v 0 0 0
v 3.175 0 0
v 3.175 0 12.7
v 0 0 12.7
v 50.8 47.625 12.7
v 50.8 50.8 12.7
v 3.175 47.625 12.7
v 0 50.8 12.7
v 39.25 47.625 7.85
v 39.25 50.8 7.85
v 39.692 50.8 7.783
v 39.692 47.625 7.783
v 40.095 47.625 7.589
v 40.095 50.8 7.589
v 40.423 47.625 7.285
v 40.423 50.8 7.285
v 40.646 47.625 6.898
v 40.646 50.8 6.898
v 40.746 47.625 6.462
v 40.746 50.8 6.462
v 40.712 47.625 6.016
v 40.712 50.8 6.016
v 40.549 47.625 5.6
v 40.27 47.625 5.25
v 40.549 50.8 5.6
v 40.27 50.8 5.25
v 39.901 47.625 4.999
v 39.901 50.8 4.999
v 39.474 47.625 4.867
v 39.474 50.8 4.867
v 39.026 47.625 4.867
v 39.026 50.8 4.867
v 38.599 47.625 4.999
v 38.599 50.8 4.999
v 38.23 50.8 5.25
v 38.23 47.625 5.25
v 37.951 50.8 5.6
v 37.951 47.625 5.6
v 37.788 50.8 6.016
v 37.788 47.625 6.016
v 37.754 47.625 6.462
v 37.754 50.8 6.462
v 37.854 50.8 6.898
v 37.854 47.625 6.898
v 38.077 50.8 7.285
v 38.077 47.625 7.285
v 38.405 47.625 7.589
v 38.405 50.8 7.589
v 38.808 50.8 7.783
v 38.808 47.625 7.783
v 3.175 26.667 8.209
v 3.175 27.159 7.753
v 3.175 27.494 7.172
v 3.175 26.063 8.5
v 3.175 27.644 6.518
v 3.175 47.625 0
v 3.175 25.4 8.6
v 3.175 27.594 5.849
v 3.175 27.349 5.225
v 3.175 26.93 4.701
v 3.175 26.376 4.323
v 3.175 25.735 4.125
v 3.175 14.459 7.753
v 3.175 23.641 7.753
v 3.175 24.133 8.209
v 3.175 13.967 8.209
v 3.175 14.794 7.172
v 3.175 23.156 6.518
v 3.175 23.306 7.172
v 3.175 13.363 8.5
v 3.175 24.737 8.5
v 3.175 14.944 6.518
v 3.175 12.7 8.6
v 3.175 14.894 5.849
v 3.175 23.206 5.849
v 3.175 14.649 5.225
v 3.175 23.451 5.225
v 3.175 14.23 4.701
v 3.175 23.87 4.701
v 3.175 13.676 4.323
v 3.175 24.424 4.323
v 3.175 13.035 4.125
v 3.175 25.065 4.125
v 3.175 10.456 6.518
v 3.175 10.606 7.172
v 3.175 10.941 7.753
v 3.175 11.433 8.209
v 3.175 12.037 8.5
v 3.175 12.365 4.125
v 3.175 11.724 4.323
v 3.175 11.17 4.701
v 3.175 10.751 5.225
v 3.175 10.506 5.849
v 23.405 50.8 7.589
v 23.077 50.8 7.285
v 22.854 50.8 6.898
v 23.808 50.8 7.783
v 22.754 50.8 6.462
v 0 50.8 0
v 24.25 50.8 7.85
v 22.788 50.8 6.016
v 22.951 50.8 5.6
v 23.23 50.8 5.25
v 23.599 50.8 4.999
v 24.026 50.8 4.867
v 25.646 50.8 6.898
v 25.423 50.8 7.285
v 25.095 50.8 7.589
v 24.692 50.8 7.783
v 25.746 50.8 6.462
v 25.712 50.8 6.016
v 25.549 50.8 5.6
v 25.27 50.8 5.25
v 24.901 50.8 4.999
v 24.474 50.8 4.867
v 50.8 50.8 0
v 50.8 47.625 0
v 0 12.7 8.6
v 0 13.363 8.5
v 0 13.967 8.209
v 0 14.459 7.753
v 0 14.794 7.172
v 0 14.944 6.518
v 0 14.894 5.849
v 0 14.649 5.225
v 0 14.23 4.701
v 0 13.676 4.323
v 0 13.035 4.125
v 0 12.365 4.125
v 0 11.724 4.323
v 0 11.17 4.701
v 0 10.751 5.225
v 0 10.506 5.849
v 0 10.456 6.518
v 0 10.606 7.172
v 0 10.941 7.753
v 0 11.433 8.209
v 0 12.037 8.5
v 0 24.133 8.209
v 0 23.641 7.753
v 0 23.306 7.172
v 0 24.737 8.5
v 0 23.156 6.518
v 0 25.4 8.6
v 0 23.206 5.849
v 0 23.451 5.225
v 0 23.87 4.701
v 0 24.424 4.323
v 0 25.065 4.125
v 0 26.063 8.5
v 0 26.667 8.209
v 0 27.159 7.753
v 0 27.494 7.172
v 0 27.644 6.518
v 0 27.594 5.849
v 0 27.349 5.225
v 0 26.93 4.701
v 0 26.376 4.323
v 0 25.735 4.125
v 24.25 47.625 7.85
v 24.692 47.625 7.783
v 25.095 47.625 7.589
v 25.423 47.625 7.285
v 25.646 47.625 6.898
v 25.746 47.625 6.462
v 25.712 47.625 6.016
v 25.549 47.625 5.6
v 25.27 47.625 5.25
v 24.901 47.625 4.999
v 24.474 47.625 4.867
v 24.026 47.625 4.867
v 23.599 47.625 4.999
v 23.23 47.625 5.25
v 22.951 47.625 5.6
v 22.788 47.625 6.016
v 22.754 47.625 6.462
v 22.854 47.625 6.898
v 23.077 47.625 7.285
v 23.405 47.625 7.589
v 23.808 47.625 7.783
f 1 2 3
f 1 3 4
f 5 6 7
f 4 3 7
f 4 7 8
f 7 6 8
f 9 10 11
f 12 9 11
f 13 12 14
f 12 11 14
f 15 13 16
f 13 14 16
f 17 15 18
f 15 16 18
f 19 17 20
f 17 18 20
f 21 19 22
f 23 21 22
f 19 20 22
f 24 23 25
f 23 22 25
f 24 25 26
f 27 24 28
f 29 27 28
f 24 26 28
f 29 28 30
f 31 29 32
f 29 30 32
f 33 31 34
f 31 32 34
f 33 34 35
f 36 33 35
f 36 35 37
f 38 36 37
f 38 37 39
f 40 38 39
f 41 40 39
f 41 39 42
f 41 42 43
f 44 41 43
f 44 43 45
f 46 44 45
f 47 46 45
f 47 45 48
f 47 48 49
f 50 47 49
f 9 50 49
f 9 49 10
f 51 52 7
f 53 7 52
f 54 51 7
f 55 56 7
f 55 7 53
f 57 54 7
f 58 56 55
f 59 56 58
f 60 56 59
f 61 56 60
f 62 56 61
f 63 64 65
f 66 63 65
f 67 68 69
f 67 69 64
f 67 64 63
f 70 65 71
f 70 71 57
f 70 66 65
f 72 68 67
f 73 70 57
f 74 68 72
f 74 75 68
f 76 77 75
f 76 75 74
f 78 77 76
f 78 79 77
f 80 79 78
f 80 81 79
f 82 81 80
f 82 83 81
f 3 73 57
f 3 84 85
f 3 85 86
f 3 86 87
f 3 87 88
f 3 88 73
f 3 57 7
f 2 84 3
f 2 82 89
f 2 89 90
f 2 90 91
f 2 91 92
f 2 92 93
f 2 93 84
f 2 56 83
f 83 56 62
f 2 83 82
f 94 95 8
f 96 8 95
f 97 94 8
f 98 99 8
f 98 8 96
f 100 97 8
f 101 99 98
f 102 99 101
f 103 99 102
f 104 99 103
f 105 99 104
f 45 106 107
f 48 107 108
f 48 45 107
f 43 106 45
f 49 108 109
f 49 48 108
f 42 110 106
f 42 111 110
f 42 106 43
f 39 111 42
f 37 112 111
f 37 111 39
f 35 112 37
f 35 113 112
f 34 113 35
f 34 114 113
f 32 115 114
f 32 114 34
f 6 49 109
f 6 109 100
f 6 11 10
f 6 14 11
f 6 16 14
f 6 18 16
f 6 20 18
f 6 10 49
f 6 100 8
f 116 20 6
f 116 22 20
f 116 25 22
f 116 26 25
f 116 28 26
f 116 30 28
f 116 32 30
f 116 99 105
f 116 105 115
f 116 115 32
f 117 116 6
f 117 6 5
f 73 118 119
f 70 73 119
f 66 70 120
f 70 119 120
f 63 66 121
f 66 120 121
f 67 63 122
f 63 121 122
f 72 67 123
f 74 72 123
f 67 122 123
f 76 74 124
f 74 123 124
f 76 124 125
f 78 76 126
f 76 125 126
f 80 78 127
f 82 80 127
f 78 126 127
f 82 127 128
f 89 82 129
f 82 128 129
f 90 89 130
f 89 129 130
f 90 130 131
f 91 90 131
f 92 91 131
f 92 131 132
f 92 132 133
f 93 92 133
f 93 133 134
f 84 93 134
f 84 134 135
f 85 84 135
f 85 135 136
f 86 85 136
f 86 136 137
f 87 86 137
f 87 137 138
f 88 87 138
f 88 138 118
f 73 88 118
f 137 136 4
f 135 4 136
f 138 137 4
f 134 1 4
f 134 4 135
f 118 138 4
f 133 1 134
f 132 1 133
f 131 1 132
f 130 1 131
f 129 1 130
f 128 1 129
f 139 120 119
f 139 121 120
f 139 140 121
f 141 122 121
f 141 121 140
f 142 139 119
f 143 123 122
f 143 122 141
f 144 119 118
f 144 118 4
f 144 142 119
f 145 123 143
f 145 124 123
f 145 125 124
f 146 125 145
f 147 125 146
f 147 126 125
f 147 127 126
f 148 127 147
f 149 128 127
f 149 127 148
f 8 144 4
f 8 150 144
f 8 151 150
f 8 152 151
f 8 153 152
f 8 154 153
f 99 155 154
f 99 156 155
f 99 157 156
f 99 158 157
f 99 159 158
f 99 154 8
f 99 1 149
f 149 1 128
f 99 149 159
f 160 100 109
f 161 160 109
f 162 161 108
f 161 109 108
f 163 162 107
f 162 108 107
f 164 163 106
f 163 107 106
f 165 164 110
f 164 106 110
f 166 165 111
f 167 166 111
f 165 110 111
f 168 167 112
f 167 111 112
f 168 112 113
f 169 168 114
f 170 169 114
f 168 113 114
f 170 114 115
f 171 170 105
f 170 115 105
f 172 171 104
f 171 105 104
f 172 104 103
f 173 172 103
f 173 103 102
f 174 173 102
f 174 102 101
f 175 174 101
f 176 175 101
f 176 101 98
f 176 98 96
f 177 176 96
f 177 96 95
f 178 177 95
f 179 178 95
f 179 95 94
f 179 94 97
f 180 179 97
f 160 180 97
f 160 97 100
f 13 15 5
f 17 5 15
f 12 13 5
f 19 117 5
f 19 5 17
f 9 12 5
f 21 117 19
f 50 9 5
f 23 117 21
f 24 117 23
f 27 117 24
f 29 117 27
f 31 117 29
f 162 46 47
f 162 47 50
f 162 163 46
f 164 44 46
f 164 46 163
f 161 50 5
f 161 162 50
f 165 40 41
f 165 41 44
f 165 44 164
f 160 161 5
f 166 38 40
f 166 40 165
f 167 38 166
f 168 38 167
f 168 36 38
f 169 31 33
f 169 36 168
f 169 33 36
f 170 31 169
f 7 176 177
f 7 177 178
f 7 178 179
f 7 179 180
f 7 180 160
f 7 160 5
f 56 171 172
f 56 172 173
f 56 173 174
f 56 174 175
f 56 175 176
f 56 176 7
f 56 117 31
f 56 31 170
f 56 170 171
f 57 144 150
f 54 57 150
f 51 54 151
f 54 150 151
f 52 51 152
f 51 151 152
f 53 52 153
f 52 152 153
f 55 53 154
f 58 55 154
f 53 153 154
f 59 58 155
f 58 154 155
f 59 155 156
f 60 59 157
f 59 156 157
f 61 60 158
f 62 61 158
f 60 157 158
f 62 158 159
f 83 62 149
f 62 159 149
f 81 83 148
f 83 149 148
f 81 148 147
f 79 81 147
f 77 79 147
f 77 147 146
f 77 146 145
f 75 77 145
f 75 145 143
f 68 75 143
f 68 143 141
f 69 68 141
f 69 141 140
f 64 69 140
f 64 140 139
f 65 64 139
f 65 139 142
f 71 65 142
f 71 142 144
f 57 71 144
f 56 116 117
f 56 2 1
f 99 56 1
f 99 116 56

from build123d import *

# Parameters (mm, degrees)
EXTRUDE_THIN1_DEPTH = 12.7
CUT_EXTRUDE1_REACH  = 74.956
SKETCH2_R           = 2.25
CUT_EXTRUDE2_REACH  = 74.956
SKETCH6_R           = 1.5


with BuildPart() as part:
    # Sketch1 → Extrude-Thin1 (new body)
    with BuildSketch(Plane.XY):
        Polygon((0, 0), (0, 50.8), (50.8, 50.8), (50.8, 47.625), (3.175, 47.625), (3.175, 0), align=None)
    extrude(amount=EXTRUDE_THIN1_DEPTH)

    # Sketch2 → Cut-Extrude1 (cut, up to next)
    with BuildSketch(Plane.ZY, mode=Mode.PRIVATE) as cut_extrude1_sk1:
        with Locations((6.35, 12.7)):
            Circle(SKETCH2_R)
    cut_extrude1_tool1 = extrude(cut_extrude1_sk1.sketch, amount=-CUT_EXTRUDE1_REACH, mode=Mode.PRIVATE) & part.part
    # Sketch2 → Cut-Extrude1 (cut, up to next)
    with BuildSketch(Plane.ZY, mode=Mode.PRIVATE) as cut_extrude1_sk2:
        with Locations((6.35, 25.4)):
            Circle(SKETCH2_R)
    cut_extrude1_tool2 = extrude(cut_extrude1_sk2.sketch, amount=-CUT_EXTRUDE1_REACH, mode=Mode.PRIVATE) & part.part
    add(cut_extrude1_tool1.solids().sort_by_distance((0, 12.7, 6.35))[0], mode=Mode.SUBTRACT)
    add(cut_extrude1_tool2.solids().sort_by_distance((0, 25.4, 6.35))[0], mode=Mode.SUBTRACT)

    # Sketch6 → Cut-Extrude2 (cut, up to next)
    with BuildSketch(Plane(origin=(0, 50.8, 0), x_dir=(1, 0, 0), z_dir=(0, 1, 0)), mode=Mode.PRIVATE) as cut_extrude2_sk1:
        with Locations(Location((24.25, -6.35, 0), (0, 0, 270))):
            Circle(SKETCH6_R)
    cut_extrude2_tool1 = extrude(cut_extrude2_sk1.sketch, amount=-CUT_EXTRUDE2_REACH, mode=Mode.PRIVATE) & part.part
    # Sketch6 → Cut-Extrude2 (cut, up to next)
    with BuildSketch(Plane(origin=(0, 50.8, 0), x_dir=(1, 0, 0), z_dir=(0, 1, 0)), mode=Mode.PRIVATE) as cut_extrude2_sk2:
        with Locations(Location((39.25, -6.35, 0), (0, 0, 270))):
            Circle(SKETCH6_R)
    cut_extrude2_tool2 = extrude(cut_extrude2_sk2.sketch, amount=-CUT_EXTRUDE2_REACH, mode=Mode.PRIVATE) & part.part
    add(cut_extrude2_tool1.solids().sort_by_distance((24.25, 50.8, 6.35))[0], mode=Mode.SUBTRACT)
    add(cut_extrude2_tool2.solids().sort_by_distance((39.25, 50.8, 6.35))[0], mode=Mode.SUBTRACT)


solid = part.part
